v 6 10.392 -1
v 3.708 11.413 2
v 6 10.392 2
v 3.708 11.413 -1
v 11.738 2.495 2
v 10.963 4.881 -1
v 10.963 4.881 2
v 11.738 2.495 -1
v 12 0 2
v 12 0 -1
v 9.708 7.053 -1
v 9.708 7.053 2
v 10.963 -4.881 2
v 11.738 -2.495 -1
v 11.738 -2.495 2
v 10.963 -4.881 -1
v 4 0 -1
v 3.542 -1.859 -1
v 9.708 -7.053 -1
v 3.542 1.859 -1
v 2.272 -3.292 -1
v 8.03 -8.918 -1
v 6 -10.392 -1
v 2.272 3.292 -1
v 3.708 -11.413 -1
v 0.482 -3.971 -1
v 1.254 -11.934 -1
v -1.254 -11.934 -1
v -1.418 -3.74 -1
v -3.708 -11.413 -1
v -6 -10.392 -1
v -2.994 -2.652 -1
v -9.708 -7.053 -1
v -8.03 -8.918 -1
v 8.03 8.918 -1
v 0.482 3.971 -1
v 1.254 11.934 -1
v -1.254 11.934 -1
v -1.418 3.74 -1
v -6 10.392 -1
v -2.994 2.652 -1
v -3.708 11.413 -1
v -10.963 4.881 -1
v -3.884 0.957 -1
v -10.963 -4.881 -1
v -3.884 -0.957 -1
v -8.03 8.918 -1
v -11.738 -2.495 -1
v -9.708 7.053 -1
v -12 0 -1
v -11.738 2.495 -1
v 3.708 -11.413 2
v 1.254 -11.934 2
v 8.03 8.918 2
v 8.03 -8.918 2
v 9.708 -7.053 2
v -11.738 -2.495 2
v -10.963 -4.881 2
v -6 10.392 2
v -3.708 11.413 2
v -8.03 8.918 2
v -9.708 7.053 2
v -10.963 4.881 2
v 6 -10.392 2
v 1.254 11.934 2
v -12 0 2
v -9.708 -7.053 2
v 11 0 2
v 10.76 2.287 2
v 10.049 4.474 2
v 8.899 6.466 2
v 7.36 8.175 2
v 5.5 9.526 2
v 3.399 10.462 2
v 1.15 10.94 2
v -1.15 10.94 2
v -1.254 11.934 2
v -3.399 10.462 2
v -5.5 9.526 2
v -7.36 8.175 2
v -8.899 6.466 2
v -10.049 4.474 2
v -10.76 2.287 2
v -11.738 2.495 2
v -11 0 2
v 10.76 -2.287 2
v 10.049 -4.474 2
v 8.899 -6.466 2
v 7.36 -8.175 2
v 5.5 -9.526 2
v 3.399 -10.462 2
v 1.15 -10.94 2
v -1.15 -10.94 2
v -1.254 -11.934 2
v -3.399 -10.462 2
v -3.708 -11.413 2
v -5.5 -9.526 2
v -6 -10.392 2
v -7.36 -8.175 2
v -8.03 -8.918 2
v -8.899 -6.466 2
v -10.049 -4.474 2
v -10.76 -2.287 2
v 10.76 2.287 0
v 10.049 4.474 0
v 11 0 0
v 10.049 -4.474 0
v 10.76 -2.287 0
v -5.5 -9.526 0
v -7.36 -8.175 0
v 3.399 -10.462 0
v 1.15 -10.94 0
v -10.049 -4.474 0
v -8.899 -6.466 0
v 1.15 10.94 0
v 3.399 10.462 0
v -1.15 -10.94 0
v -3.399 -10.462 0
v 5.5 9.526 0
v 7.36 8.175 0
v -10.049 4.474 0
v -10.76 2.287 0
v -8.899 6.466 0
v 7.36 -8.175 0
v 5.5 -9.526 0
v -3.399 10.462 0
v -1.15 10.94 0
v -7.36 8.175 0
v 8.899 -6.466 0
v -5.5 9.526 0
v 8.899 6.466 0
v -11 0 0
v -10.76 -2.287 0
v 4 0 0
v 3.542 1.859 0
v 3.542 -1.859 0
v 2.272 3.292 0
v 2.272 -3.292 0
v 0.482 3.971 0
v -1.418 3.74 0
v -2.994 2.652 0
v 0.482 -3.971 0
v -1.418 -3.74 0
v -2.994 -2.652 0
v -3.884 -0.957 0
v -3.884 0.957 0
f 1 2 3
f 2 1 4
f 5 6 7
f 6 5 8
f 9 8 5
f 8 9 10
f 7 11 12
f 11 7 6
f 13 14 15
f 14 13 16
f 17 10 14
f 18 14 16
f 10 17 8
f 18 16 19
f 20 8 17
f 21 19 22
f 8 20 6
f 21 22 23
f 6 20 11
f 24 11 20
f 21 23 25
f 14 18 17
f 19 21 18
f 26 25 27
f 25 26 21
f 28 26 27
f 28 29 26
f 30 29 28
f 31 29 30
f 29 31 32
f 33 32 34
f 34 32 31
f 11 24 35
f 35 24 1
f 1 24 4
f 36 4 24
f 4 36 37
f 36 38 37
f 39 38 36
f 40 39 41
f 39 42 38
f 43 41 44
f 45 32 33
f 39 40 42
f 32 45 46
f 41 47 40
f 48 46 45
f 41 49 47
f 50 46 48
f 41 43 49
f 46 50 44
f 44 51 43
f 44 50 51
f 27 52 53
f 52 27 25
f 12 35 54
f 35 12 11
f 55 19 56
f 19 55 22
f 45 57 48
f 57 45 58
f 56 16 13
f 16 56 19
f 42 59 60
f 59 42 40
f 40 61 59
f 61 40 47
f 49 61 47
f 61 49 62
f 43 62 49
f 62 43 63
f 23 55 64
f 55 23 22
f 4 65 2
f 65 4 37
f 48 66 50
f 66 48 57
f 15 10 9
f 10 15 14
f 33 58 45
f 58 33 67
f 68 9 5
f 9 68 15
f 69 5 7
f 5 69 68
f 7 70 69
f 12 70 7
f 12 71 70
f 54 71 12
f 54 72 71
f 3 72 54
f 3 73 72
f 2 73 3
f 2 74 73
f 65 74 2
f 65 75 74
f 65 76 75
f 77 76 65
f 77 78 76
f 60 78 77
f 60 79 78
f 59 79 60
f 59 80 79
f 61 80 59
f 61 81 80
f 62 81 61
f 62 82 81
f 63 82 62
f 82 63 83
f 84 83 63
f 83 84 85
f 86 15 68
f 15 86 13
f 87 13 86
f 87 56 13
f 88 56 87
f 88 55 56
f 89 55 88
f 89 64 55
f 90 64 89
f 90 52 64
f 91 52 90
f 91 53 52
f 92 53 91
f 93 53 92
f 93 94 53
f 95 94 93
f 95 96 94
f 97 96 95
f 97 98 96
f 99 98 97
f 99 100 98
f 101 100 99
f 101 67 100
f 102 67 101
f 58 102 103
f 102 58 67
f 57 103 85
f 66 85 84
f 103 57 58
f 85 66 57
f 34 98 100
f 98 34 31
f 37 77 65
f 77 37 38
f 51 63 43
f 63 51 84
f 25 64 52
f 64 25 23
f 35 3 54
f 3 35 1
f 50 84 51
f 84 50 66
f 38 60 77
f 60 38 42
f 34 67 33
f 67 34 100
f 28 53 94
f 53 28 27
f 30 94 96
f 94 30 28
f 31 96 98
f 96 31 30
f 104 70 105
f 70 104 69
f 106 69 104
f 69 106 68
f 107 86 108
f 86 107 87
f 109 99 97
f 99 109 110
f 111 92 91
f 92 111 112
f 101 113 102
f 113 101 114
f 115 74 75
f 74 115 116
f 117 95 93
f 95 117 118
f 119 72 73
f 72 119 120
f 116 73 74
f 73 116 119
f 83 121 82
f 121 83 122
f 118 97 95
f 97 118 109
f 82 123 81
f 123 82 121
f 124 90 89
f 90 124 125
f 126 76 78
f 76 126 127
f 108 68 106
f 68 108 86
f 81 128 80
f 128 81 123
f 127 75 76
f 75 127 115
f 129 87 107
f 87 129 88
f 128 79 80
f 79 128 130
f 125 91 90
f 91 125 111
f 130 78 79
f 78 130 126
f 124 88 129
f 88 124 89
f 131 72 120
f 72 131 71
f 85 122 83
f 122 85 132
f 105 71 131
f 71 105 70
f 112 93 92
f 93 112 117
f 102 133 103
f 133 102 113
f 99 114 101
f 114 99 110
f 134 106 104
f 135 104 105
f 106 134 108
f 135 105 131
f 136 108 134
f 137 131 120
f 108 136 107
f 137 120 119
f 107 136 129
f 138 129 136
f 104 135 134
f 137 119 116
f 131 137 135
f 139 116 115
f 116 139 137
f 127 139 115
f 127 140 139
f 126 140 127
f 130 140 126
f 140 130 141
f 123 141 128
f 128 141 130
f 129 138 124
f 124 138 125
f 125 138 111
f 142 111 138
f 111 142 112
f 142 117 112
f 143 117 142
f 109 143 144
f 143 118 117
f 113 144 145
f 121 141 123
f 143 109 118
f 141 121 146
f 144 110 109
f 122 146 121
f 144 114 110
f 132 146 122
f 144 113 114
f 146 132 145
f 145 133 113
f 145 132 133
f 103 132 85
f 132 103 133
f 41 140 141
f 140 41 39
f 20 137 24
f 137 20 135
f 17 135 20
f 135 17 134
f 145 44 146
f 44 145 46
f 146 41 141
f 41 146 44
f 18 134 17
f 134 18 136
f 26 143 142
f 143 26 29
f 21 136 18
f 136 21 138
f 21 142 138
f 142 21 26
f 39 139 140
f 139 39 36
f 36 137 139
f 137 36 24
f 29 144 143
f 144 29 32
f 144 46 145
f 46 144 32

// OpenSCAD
608_height=8;

608_diameter=22;

difference()
{
translate([0,0,-1])
cylinder(r=608_diameter/2+1,h=3);

#cylinder(r=608_diameter/2,h=608_height);
translate([0,0,-2])
#cylinder(r=8/2,h=608_height+4);

}
